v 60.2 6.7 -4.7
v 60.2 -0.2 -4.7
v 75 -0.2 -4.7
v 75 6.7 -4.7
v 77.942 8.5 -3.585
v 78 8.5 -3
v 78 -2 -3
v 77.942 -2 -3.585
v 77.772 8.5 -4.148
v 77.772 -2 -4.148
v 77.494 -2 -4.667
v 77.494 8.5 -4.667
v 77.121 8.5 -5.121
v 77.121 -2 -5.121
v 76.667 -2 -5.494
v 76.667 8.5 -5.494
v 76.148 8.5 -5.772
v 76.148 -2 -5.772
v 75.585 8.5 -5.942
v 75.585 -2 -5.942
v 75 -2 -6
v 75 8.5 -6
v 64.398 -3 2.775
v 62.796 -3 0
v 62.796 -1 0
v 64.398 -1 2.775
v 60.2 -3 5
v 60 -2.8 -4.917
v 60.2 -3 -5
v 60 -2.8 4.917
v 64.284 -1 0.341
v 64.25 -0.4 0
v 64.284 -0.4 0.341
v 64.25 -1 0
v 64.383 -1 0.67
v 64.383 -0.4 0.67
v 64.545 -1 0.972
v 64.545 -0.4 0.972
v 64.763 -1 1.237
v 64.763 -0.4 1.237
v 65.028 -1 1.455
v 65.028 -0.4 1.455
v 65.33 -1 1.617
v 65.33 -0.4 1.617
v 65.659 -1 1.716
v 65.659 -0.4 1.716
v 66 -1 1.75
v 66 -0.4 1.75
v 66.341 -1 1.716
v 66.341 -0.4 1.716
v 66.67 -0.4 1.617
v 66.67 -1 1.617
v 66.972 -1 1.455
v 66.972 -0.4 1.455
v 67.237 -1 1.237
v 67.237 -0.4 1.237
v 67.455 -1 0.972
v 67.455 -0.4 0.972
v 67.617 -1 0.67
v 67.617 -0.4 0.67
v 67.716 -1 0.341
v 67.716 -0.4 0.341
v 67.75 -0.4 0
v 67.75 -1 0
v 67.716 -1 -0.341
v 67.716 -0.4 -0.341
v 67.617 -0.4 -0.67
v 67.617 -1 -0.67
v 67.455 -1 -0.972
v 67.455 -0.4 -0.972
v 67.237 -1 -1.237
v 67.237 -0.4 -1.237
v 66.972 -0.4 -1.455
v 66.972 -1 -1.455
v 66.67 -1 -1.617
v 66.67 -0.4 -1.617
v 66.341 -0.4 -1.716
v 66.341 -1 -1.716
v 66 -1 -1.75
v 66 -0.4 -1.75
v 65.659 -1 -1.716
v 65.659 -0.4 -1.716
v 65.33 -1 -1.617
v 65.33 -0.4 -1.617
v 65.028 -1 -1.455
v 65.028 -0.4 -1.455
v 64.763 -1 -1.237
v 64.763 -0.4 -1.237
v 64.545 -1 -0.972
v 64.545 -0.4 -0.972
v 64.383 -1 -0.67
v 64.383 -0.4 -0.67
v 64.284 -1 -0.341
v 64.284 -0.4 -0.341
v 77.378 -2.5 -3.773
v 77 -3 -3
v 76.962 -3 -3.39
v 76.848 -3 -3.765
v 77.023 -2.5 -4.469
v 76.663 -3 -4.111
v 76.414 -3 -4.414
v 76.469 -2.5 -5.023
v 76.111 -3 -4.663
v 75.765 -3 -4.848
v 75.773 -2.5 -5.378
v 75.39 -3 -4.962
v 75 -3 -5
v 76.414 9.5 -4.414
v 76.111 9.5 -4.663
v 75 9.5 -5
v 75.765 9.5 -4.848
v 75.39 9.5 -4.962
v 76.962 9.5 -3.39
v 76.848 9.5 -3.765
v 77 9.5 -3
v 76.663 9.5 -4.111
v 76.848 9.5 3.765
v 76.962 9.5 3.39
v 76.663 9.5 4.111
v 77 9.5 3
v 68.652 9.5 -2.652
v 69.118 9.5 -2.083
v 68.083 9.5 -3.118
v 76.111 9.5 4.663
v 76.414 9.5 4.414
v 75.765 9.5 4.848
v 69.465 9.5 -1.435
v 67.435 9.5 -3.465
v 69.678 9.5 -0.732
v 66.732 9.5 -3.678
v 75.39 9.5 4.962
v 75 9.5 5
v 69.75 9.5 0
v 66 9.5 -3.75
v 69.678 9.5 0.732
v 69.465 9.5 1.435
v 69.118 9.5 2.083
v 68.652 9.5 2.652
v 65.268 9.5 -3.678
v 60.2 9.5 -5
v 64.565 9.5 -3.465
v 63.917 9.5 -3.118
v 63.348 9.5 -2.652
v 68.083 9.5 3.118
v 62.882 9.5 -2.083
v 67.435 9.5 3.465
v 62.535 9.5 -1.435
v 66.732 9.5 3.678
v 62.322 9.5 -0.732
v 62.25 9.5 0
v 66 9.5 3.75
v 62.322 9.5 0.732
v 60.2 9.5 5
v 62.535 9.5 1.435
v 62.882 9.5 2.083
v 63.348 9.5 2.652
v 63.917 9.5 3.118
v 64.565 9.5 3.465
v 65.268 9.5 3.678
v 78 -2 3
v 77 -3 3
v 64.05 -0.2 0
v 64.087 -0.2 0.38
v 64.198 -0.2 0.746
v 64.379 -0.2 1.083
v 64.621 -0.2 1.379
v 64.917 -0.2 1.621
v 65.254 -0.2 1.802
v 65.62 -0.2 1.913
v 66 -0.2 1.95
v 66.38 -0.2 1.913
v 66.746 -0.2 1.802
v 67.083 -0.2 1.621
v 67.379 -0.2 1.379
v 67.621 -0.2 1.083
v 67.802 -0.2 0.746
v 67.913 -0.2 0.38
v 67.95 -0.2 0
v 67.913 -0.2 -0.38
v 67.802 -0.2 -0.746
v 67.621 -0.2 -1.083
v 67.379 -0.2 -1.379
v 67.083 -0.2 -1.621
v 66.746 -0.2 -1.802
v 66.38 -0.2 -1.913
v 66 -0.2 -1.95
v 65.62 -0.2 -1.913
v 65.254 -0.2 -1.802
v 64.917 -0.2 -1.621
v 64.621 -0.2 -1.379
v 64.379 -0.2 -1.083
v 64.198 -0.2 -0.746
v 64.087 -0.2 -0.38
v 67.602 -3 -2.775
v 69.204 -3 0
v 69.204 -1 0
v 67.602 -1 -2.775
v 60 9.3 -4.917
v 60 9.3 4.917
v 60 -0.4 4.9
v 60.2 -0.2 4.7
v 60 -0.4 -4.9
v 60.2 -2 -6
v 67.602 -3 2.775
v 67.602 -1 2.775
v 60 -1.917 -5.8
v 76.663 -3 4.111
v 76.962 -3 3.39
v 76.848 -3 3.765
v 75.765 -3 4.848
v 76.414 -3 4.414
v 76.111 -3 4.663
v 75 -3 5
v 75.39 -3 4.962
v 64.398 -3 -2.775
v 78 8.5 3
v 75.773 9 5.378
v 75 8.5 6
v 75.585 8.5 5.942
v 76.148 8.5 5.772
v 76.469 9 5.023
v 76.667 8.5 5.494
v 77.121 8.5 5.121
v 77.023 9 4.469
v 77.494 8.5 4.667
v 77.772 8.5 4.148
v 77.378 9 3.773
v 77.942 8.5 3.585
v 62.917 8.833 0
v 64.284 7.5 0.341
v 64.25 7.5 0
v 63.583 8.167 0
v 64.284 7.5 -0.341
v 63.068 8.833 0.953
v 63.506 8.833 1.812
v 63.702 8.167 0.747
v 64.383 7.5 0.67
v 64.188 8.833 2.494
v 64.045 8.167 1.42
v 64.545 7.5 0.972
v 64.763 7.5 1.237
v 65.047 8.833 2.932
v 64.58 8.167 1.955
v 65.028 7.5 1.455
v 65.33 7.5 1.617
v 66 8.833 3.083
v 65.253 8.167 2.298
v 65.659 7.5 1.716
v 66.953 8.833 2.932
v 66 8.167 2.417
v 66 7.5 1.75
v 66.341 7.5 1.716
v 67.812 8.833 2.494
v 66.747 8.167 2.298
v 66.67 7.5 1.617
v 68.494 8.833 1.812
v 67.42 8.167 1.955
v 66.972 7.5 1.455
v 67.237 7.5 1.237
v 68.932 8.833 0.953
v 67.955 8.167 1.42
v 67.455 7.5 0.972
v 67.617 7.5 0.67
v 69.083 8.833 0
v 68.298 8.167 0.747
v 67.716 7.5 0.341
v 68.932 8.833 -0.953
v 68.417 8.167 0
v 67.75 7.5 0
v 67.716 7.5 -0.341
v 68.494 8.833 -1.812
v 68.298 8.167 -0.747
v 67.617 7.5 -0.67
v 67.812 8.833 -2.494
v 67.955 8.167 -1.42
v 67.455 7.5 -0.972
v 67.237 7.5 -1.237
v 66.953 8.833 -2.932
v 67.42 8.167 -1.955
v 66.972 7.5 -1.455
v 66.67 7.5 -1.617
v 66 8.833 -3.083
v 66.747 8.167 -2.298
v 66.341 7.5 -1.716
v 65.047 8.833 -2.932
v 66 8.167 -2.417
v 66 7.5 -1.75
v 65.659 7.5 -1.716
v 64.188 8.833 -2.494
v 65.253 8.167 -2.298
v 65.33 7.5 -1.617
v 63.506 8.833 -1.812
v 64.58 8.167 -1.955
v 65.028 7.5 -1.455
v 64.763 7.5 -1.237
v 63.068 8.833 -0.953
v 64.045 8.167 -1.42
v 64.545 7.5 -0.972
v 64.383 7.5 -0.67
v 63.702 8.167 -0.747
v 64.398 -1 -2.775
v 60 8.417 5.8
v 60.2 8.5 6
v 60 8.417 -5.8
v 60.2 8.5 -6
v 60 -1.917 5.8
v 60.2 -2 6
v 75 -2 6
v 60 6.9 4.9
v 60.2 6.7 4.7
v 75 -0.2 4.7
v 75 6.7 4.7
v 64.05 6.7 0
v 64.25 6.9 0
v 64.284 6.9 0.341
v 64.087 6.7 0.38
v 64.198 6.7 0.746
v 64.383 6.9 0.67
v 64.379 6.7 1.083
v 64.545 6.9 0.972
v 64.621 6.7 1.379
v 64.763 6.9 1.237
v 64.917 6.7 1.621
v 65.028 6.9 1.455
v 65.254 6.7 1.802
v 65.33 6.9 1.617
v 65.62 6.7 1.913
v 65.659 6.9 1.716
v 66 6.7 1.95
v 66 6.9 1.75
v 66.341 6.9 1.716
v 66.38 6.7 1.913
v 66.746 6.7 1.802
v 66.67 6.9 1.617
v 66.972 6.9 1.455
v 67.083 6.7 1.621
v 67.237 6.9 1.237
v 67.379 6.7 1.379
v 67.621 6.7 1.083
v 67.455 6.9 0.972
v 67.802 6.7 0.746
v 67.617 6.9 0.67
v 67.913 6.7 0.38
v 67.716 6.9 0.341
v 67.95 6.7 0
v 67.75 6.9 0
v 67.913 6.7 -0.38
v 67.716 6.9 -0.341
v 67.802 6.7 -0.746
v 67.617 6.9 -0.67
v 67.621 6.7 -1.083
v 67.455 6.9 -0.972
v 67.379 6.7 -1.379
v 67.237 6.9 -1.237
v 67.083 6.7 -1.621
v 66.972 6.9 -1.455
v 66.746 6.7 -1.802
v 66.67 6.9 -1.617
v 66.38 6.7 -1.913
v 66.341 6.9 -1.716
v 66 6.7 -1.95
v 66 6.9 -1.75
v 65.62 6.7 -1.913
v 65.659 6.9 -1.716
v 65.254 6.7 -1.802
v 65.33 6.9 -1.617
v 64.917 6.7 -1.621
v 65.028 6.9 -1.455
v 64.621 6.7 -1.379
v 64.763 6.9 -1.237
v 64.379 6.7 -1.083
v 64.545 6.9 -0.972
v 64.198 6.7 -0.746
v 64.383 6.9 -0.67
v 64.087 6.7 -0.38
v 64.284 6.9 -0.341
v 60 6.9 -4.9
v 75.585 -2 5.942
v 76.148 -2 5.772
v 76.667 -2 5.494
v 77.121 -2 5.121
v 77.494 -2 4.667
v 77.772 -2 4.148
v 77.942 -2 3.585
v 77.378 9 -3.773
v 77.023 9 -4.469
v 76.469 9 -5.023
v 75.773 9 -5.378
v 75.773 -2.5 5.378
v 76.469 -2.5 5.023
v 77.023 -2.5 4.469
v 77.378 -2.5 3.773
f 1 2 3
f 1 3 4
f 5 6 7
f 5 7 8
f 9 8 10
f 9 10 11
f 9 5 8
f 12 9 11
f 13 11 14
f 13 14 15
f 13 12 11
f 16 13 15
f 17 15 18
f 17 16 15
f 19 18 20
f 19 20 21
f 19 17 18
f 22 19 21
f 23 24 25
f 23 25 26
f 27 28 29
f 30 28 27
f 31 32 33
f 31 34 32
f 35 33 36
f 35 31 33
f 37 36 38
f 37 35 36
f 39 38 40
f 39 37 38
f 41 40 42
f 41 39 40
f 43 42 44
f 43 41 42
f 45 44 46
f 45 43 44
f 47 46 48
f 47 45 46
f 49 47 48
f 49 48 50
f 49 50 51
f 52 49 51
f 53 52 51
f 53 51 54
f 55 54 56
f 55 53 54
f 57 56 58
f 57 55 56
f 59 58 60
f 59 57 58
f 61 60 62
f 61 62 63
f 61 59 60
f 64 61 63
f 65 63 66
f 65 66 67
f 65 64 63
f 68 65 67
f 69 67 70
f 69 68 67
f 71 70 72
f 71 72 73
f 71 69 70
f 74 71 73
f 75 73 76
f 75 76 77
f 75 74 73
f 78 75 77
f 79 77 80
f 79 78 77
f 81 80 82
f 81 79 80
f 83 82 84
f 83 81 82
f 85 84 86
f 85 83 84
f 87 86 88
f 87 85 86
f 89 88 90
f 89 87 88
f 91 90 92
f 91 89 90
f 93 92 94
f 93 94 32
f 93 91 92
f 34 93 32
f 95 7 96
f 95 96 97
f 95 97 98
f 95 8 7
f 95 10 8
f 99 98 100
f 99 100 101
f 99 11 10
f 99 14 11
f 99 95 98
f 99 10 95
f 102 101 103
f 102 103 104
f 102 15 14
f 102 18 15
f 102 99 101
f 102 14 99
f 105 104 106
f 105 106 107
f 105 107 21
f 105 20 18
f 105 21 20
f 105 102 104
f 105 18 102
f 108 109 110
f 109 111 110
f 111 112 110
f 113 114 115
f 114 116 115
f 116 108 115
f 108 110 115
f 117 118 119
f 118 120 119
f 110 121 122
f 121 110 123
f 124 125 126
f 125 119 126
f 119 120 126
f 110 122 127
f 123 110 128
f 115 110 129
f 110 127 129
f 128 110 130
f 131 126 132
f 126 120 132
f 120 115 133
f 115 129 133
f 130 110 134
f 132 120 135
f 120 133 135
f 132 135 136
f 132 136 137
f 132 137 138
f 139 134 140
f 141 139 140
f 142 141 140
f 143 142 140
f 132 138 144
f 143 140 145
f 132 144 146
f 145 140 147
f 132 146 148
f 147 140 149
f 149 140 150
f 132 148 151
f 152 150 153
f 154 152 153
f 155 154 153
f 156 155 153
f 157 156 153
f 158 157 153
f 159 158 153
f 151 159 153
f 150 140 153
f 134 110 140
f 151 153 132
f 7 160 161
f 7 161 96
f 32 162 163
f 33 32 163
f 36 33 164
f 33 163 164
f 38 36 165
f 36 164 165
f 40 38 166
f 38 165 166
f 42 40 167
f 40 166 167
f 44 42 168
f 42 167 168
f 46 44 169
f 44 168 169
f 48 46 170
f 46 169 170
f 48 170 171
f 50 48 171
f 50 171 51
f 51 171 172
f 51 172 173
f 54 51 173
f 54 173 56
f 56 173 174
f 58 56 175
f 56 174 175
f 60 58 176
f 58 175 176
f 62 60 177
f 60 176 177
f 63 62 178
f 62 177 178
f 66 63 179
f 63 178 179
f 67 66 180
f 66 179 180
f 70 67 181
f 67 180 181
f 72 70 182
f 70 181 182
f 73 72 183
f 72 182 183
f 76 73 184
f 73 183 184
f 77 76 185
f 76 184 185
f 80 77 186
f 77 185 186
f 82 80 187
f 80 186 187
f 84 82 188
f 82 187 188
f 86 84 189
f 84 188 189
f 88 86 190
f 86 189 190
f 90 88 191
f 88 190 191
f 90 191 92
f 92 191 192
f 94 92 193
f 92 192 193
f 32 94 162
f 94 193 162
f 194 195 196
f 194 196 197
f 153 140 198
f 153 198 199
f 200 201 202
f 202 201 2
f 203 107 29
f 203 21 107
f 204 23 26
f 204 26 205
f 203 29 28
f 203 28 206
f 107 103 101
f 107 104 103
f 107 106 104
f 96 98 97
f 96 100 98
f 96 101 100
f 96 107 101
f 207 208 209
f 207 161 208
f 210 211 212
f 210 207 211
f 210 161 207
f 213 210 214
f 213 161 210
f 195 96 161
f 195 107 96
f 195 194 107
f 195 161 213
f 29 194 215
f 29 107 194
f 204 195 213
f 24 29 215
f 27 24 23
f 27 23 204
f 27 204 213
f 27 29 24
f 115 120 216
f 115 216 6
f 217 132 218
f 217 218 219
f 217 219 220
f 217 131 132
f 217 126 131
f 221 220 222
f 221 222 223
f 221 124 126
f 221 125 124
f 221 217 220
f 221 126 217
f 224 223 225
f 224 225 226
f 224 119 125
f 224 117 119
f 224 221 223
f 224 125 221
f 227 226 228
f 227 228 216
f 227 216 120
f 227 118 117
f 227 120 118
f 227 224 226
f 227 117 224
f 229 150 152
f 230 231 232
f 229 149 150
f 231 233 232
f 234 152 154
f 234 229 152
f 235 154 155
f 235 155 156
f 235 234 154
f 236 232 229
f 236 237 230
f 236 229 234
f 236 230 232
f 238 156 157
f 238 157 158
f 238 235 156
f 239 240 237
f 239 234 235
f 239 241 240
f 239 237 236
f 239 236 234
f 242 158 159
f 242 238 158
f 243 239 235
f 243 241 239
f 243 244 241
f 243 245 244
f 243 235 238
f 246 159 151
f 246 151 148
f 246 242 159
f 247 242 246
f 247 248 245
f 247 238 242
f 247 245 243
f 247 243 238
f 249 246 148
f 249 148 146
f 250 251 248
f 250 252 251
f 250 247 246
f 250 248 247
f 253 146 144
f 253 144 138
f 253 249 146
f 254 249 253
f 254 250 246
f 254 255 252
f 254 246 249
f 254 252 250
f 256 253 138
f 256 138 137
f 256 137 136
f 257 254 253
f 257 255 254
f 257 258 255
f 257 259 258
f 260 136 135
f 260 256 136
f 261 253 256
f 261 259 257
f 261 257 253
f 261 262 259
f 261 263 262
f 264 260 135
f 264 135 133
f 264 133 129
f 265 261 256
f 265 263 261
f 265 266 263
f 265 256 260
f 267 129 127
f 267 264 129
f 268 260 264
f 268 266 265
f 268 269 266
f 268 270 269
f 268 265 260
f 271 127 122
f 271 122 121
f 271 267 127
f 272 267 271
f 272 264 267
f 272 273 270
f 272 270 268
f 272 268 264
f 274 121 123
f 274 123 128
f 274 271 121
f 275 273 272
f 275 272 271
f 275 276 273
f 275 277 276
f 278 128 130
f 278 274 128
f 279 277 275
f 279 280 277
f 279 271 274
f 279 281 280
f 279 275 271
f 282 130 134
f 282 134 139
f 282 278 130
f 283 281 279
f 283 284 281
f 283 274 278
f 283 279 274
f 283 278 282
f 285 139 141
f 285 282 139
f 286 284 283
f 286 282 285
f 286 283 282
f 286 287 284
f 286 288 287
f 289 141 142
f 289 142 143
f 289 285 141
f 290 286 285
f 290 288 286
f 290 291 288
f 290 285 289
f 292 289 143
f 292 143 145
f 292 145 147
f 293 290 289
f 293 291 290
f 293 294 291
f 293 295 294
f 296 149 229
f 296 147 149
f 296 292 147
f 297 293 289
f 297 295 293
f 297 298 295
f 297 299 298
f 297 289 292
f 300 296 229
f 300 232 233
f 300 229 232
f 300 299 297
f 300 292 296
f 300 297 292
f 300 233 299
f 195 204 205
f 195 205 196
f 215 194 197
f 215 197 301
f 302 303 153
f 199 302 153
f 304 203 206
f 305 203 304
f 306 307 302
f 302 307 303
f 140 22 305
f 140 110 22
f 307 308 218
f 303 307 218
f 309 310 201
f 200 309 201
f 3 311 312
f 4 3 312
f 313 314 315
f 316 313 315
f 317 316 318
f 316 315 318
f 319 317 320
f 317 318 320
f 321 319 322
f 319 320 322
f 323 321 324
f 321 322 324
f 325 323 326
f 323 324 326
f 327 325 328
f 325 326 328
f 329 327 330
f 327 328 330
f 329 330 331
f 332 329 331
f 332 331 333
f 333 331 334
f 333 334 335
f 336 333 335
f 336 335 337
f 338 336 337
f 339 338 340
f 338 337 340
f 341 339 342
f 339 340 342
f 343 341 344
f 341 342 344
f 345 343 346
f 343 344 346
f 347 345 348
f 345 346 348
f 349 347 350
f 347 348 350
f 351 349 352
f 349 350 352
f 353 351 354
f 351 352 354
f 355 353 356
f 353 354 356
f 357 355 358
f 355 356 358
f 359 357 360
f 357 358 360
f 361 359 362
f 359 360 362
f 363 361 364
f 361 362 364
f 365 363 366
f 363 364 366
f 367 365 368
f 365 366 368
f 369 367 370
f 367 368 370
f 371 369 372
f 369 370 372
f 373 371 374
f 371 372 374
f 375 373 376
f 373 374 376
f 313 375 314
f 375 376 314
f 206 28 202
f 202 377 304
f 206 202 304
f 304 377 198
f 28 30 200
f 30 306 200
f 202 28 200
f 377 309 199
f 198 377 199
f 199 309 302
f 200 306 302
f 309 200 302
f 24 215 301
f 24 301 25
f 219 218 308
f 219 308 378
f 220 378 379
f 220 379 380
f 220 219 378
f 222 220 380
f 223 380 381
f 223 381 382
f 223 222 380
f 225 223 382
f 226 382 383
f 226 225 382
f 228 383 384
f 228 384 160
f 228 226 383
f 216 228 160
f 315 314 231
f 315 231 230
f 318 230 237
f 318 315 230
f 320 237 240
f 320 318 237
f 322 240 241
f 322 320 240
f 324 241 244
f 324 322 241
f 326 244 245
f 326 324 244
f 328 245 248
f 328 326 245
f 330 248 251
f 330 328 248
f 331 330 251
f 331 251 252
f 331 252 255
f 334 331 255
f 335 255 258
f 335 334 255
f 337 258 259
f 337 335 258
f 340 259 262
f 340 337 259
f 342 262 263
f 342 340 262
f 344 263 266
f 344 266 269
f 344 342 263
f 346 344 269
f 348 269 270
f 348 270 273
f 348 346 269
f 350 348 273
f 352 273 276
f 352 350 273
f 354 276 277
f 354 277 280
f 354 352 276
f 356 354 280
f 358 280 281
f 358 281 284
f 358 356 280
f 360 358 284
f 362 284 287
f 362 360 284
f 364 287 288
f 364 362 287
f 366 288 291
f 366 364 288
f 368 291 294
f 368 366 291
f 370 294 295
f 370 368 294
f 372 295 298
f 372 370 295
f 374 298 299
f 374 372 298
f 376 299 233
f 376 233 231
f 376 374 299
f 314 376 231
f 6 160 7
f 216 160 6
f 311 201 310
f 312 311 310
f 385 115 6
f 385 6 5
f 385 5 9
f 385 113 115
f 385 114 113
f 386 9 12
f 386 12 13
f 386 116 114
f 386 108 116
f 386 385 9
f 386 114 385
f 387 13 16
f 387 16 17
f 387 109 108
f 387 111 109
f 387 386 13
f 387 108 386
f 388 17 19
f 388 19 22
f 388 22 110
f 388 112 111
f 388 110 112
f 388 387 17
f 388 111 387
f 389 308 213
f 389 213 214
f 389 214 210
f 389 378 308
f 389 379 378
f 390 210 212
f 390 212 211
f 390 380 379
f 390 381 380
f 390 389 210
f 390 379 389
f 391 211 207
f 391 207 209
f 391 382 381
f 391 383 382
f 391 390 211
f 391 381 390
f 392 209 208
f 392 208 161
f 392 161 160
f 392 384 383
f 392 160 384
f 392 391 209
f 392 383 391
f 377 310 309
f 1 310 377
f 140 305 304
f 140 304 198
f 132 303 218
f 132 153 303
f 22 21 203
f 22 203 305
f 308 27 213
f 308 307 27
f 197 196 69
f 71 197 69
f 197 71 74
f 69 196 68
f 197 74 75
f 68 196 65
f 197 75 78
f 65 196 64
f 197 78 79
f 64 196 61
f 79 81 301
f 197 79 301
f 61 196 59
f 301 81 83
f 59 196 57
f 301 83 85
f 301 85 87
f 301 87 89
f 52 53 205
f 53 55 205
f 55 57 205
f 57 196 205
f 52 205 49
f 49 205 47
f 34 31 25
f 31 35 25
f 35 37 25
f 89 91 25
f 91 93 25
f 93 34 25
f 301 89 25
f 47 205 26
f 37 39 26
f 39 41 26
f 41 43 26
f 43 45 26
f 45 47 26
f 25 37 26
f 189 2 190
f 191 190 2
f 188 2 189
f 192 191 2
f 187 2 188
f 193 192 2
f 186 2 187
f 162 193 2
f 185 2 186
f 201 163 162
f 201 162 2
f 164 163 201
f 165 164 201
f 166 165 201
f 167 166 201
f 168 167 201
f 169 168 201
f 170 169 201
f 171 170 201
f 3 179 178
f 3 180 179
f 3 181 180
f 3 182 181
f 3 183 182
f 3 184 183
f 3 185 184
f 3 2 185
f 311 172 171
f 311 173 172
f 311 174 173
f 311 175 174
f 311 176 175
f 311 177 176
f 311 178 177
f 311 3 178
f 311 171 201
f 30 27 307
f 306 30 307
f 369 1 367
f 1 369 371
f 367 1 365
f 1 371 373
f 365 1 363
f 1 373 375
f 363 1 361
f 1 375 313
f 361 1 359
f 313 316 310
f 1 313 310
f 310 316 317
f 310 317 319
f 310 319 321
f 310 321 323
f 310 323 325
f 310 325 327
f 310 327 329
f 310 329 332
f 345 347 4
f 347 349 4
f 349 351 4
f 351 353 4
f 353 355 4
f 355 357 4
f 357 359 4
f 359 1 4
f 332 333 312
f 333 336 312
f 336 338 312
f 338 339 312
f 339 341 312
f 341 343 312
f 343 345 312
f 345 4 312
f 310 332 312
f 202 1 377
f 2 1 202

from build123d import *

# Parameters (mm, degrees)
SKETCH007_W       = 12.5
SKETCH007_H       = 12
PAD004_DEPTH      = 15
PAD004_DEPTH_BACK = 3
FILLET006_R       = 3
SKETCH008_W       = 6.9
SKETCH008_H       = 9.4
POCKET005_DEPTH   = 22
SKETCH009_R       = 1.75
POCKET006_DEPTH   = 12
CHAMFER005_SIZE   = 1
CHAMFER006_SIZE   = 0.2
CHAMFER007_SIZE   = 2
POCKET007_DEPTH   = 2


with BuildPart() as but_e:
    # Sketch007 → Pad004 (new body, two sides)
    with BuildSketch(Plane.YZ) as pad004_sk:
        Rectangle(SKETCH007_W, SKETCH007_H)
    extrude(amount=PAD004_DEPTH)
    extrude(pad004_sk.sketch, amount=-PAD004_DEPTH_BACK)

    # Fillet006
    fillet006_edges = [but_e.edges().sort_by_distance(p)[0] for p in [
        (-3, 0, 6),
        (-3, 0, -6),
    ]]
    fillet(fillet006_edges, radius=FILLET006_R)

    # Sketch008 → Pocket005 (cut)
    with BuildSketch(Plane.YZ):
        Rectangle(SKETCH008_W, SKETCH008_H)
    extrude(amount=POCKET005_DEPTH, mode=Mode.SUBTRACT)

    # Sketch009 → Pocket006 (cut, symmetric)
    with BuildSketch(Plane.XZ):
        with Locations((9, 0)):
            Circle(SKETCH009_R)
    extrude(amount=POCKET006_DEPTH, both=True, mode=Mode.SUBTRACT)

    # Chamfer005
    chamfer005_edges = [but_e.edges().sort_by_distance(p)[0] for p in [
        (7.5, -6.25, 6),
        (7.5, 6.25, 6),
    ]]
    chamfer(chamfer005_edges, length=CHAMFER005_SIZE)

    # Chamfer006
    chamfer006_edges = [but_e.edges().sort_by_distance(p)[0] for p in [
        (15, -6.25, 0),
        (15, -5.75, -5.5),
        (15, -5.75, 5.5),
        (15, 0, -6),
        (15, 0, 6),
        (15, 5.75, -5.5),
        (15, 5.75, 5.5),
        (15, 6.25, 0),
        (15, -3.45, 0),
        (15, 0, -4.7),
        (15, 3.45, 0),
        (15, 0, 4.7),
        (7.25, -3.45, 0),
        (7.25, 3.45, 0),
    ]]
    chamfer(chamfer006_edges, length=CHAMFER006_SIZE)

    # Chamfer007
    chamfer007_edges = [but_e.edges().sort_by_distance(p)[0] for p in [
        (7.25, 6.25, 0),
    ]]
    chamfer(chamfer007_edges, length=CHAMFER007_SIZE)

    # Sketch010 (on Face34 of Chamfer007) → Pocket007 (cut)
    with BuildSketch(Plane.XZ.offset(6.25)):
        Polygon((12.204294, 0), (10.602147, 2.775), (7.397853, 2.775), (5.795706, 0), (7.397853, -2.775), (10.602147, -2.775), align=None)
    extrude(amount=-POCKET007_DEPTH, mode=Mode.SUBTRACT)


with BuildPart() as but_e_1:
    # Body003 placement: moved
    add(but_e.part.moved(Location((-75, 3.25, 0))))


with BuildPart() as part_mirroring001:
    # Part__Mirroring001: instance of Butée
    add(but_e_1.part.mirror(Plane(origin=(0, 0, 0), x_dir=(0, -1, 0), z_dir=(1, 0, 0))))


solid = part_mirroring001.part
